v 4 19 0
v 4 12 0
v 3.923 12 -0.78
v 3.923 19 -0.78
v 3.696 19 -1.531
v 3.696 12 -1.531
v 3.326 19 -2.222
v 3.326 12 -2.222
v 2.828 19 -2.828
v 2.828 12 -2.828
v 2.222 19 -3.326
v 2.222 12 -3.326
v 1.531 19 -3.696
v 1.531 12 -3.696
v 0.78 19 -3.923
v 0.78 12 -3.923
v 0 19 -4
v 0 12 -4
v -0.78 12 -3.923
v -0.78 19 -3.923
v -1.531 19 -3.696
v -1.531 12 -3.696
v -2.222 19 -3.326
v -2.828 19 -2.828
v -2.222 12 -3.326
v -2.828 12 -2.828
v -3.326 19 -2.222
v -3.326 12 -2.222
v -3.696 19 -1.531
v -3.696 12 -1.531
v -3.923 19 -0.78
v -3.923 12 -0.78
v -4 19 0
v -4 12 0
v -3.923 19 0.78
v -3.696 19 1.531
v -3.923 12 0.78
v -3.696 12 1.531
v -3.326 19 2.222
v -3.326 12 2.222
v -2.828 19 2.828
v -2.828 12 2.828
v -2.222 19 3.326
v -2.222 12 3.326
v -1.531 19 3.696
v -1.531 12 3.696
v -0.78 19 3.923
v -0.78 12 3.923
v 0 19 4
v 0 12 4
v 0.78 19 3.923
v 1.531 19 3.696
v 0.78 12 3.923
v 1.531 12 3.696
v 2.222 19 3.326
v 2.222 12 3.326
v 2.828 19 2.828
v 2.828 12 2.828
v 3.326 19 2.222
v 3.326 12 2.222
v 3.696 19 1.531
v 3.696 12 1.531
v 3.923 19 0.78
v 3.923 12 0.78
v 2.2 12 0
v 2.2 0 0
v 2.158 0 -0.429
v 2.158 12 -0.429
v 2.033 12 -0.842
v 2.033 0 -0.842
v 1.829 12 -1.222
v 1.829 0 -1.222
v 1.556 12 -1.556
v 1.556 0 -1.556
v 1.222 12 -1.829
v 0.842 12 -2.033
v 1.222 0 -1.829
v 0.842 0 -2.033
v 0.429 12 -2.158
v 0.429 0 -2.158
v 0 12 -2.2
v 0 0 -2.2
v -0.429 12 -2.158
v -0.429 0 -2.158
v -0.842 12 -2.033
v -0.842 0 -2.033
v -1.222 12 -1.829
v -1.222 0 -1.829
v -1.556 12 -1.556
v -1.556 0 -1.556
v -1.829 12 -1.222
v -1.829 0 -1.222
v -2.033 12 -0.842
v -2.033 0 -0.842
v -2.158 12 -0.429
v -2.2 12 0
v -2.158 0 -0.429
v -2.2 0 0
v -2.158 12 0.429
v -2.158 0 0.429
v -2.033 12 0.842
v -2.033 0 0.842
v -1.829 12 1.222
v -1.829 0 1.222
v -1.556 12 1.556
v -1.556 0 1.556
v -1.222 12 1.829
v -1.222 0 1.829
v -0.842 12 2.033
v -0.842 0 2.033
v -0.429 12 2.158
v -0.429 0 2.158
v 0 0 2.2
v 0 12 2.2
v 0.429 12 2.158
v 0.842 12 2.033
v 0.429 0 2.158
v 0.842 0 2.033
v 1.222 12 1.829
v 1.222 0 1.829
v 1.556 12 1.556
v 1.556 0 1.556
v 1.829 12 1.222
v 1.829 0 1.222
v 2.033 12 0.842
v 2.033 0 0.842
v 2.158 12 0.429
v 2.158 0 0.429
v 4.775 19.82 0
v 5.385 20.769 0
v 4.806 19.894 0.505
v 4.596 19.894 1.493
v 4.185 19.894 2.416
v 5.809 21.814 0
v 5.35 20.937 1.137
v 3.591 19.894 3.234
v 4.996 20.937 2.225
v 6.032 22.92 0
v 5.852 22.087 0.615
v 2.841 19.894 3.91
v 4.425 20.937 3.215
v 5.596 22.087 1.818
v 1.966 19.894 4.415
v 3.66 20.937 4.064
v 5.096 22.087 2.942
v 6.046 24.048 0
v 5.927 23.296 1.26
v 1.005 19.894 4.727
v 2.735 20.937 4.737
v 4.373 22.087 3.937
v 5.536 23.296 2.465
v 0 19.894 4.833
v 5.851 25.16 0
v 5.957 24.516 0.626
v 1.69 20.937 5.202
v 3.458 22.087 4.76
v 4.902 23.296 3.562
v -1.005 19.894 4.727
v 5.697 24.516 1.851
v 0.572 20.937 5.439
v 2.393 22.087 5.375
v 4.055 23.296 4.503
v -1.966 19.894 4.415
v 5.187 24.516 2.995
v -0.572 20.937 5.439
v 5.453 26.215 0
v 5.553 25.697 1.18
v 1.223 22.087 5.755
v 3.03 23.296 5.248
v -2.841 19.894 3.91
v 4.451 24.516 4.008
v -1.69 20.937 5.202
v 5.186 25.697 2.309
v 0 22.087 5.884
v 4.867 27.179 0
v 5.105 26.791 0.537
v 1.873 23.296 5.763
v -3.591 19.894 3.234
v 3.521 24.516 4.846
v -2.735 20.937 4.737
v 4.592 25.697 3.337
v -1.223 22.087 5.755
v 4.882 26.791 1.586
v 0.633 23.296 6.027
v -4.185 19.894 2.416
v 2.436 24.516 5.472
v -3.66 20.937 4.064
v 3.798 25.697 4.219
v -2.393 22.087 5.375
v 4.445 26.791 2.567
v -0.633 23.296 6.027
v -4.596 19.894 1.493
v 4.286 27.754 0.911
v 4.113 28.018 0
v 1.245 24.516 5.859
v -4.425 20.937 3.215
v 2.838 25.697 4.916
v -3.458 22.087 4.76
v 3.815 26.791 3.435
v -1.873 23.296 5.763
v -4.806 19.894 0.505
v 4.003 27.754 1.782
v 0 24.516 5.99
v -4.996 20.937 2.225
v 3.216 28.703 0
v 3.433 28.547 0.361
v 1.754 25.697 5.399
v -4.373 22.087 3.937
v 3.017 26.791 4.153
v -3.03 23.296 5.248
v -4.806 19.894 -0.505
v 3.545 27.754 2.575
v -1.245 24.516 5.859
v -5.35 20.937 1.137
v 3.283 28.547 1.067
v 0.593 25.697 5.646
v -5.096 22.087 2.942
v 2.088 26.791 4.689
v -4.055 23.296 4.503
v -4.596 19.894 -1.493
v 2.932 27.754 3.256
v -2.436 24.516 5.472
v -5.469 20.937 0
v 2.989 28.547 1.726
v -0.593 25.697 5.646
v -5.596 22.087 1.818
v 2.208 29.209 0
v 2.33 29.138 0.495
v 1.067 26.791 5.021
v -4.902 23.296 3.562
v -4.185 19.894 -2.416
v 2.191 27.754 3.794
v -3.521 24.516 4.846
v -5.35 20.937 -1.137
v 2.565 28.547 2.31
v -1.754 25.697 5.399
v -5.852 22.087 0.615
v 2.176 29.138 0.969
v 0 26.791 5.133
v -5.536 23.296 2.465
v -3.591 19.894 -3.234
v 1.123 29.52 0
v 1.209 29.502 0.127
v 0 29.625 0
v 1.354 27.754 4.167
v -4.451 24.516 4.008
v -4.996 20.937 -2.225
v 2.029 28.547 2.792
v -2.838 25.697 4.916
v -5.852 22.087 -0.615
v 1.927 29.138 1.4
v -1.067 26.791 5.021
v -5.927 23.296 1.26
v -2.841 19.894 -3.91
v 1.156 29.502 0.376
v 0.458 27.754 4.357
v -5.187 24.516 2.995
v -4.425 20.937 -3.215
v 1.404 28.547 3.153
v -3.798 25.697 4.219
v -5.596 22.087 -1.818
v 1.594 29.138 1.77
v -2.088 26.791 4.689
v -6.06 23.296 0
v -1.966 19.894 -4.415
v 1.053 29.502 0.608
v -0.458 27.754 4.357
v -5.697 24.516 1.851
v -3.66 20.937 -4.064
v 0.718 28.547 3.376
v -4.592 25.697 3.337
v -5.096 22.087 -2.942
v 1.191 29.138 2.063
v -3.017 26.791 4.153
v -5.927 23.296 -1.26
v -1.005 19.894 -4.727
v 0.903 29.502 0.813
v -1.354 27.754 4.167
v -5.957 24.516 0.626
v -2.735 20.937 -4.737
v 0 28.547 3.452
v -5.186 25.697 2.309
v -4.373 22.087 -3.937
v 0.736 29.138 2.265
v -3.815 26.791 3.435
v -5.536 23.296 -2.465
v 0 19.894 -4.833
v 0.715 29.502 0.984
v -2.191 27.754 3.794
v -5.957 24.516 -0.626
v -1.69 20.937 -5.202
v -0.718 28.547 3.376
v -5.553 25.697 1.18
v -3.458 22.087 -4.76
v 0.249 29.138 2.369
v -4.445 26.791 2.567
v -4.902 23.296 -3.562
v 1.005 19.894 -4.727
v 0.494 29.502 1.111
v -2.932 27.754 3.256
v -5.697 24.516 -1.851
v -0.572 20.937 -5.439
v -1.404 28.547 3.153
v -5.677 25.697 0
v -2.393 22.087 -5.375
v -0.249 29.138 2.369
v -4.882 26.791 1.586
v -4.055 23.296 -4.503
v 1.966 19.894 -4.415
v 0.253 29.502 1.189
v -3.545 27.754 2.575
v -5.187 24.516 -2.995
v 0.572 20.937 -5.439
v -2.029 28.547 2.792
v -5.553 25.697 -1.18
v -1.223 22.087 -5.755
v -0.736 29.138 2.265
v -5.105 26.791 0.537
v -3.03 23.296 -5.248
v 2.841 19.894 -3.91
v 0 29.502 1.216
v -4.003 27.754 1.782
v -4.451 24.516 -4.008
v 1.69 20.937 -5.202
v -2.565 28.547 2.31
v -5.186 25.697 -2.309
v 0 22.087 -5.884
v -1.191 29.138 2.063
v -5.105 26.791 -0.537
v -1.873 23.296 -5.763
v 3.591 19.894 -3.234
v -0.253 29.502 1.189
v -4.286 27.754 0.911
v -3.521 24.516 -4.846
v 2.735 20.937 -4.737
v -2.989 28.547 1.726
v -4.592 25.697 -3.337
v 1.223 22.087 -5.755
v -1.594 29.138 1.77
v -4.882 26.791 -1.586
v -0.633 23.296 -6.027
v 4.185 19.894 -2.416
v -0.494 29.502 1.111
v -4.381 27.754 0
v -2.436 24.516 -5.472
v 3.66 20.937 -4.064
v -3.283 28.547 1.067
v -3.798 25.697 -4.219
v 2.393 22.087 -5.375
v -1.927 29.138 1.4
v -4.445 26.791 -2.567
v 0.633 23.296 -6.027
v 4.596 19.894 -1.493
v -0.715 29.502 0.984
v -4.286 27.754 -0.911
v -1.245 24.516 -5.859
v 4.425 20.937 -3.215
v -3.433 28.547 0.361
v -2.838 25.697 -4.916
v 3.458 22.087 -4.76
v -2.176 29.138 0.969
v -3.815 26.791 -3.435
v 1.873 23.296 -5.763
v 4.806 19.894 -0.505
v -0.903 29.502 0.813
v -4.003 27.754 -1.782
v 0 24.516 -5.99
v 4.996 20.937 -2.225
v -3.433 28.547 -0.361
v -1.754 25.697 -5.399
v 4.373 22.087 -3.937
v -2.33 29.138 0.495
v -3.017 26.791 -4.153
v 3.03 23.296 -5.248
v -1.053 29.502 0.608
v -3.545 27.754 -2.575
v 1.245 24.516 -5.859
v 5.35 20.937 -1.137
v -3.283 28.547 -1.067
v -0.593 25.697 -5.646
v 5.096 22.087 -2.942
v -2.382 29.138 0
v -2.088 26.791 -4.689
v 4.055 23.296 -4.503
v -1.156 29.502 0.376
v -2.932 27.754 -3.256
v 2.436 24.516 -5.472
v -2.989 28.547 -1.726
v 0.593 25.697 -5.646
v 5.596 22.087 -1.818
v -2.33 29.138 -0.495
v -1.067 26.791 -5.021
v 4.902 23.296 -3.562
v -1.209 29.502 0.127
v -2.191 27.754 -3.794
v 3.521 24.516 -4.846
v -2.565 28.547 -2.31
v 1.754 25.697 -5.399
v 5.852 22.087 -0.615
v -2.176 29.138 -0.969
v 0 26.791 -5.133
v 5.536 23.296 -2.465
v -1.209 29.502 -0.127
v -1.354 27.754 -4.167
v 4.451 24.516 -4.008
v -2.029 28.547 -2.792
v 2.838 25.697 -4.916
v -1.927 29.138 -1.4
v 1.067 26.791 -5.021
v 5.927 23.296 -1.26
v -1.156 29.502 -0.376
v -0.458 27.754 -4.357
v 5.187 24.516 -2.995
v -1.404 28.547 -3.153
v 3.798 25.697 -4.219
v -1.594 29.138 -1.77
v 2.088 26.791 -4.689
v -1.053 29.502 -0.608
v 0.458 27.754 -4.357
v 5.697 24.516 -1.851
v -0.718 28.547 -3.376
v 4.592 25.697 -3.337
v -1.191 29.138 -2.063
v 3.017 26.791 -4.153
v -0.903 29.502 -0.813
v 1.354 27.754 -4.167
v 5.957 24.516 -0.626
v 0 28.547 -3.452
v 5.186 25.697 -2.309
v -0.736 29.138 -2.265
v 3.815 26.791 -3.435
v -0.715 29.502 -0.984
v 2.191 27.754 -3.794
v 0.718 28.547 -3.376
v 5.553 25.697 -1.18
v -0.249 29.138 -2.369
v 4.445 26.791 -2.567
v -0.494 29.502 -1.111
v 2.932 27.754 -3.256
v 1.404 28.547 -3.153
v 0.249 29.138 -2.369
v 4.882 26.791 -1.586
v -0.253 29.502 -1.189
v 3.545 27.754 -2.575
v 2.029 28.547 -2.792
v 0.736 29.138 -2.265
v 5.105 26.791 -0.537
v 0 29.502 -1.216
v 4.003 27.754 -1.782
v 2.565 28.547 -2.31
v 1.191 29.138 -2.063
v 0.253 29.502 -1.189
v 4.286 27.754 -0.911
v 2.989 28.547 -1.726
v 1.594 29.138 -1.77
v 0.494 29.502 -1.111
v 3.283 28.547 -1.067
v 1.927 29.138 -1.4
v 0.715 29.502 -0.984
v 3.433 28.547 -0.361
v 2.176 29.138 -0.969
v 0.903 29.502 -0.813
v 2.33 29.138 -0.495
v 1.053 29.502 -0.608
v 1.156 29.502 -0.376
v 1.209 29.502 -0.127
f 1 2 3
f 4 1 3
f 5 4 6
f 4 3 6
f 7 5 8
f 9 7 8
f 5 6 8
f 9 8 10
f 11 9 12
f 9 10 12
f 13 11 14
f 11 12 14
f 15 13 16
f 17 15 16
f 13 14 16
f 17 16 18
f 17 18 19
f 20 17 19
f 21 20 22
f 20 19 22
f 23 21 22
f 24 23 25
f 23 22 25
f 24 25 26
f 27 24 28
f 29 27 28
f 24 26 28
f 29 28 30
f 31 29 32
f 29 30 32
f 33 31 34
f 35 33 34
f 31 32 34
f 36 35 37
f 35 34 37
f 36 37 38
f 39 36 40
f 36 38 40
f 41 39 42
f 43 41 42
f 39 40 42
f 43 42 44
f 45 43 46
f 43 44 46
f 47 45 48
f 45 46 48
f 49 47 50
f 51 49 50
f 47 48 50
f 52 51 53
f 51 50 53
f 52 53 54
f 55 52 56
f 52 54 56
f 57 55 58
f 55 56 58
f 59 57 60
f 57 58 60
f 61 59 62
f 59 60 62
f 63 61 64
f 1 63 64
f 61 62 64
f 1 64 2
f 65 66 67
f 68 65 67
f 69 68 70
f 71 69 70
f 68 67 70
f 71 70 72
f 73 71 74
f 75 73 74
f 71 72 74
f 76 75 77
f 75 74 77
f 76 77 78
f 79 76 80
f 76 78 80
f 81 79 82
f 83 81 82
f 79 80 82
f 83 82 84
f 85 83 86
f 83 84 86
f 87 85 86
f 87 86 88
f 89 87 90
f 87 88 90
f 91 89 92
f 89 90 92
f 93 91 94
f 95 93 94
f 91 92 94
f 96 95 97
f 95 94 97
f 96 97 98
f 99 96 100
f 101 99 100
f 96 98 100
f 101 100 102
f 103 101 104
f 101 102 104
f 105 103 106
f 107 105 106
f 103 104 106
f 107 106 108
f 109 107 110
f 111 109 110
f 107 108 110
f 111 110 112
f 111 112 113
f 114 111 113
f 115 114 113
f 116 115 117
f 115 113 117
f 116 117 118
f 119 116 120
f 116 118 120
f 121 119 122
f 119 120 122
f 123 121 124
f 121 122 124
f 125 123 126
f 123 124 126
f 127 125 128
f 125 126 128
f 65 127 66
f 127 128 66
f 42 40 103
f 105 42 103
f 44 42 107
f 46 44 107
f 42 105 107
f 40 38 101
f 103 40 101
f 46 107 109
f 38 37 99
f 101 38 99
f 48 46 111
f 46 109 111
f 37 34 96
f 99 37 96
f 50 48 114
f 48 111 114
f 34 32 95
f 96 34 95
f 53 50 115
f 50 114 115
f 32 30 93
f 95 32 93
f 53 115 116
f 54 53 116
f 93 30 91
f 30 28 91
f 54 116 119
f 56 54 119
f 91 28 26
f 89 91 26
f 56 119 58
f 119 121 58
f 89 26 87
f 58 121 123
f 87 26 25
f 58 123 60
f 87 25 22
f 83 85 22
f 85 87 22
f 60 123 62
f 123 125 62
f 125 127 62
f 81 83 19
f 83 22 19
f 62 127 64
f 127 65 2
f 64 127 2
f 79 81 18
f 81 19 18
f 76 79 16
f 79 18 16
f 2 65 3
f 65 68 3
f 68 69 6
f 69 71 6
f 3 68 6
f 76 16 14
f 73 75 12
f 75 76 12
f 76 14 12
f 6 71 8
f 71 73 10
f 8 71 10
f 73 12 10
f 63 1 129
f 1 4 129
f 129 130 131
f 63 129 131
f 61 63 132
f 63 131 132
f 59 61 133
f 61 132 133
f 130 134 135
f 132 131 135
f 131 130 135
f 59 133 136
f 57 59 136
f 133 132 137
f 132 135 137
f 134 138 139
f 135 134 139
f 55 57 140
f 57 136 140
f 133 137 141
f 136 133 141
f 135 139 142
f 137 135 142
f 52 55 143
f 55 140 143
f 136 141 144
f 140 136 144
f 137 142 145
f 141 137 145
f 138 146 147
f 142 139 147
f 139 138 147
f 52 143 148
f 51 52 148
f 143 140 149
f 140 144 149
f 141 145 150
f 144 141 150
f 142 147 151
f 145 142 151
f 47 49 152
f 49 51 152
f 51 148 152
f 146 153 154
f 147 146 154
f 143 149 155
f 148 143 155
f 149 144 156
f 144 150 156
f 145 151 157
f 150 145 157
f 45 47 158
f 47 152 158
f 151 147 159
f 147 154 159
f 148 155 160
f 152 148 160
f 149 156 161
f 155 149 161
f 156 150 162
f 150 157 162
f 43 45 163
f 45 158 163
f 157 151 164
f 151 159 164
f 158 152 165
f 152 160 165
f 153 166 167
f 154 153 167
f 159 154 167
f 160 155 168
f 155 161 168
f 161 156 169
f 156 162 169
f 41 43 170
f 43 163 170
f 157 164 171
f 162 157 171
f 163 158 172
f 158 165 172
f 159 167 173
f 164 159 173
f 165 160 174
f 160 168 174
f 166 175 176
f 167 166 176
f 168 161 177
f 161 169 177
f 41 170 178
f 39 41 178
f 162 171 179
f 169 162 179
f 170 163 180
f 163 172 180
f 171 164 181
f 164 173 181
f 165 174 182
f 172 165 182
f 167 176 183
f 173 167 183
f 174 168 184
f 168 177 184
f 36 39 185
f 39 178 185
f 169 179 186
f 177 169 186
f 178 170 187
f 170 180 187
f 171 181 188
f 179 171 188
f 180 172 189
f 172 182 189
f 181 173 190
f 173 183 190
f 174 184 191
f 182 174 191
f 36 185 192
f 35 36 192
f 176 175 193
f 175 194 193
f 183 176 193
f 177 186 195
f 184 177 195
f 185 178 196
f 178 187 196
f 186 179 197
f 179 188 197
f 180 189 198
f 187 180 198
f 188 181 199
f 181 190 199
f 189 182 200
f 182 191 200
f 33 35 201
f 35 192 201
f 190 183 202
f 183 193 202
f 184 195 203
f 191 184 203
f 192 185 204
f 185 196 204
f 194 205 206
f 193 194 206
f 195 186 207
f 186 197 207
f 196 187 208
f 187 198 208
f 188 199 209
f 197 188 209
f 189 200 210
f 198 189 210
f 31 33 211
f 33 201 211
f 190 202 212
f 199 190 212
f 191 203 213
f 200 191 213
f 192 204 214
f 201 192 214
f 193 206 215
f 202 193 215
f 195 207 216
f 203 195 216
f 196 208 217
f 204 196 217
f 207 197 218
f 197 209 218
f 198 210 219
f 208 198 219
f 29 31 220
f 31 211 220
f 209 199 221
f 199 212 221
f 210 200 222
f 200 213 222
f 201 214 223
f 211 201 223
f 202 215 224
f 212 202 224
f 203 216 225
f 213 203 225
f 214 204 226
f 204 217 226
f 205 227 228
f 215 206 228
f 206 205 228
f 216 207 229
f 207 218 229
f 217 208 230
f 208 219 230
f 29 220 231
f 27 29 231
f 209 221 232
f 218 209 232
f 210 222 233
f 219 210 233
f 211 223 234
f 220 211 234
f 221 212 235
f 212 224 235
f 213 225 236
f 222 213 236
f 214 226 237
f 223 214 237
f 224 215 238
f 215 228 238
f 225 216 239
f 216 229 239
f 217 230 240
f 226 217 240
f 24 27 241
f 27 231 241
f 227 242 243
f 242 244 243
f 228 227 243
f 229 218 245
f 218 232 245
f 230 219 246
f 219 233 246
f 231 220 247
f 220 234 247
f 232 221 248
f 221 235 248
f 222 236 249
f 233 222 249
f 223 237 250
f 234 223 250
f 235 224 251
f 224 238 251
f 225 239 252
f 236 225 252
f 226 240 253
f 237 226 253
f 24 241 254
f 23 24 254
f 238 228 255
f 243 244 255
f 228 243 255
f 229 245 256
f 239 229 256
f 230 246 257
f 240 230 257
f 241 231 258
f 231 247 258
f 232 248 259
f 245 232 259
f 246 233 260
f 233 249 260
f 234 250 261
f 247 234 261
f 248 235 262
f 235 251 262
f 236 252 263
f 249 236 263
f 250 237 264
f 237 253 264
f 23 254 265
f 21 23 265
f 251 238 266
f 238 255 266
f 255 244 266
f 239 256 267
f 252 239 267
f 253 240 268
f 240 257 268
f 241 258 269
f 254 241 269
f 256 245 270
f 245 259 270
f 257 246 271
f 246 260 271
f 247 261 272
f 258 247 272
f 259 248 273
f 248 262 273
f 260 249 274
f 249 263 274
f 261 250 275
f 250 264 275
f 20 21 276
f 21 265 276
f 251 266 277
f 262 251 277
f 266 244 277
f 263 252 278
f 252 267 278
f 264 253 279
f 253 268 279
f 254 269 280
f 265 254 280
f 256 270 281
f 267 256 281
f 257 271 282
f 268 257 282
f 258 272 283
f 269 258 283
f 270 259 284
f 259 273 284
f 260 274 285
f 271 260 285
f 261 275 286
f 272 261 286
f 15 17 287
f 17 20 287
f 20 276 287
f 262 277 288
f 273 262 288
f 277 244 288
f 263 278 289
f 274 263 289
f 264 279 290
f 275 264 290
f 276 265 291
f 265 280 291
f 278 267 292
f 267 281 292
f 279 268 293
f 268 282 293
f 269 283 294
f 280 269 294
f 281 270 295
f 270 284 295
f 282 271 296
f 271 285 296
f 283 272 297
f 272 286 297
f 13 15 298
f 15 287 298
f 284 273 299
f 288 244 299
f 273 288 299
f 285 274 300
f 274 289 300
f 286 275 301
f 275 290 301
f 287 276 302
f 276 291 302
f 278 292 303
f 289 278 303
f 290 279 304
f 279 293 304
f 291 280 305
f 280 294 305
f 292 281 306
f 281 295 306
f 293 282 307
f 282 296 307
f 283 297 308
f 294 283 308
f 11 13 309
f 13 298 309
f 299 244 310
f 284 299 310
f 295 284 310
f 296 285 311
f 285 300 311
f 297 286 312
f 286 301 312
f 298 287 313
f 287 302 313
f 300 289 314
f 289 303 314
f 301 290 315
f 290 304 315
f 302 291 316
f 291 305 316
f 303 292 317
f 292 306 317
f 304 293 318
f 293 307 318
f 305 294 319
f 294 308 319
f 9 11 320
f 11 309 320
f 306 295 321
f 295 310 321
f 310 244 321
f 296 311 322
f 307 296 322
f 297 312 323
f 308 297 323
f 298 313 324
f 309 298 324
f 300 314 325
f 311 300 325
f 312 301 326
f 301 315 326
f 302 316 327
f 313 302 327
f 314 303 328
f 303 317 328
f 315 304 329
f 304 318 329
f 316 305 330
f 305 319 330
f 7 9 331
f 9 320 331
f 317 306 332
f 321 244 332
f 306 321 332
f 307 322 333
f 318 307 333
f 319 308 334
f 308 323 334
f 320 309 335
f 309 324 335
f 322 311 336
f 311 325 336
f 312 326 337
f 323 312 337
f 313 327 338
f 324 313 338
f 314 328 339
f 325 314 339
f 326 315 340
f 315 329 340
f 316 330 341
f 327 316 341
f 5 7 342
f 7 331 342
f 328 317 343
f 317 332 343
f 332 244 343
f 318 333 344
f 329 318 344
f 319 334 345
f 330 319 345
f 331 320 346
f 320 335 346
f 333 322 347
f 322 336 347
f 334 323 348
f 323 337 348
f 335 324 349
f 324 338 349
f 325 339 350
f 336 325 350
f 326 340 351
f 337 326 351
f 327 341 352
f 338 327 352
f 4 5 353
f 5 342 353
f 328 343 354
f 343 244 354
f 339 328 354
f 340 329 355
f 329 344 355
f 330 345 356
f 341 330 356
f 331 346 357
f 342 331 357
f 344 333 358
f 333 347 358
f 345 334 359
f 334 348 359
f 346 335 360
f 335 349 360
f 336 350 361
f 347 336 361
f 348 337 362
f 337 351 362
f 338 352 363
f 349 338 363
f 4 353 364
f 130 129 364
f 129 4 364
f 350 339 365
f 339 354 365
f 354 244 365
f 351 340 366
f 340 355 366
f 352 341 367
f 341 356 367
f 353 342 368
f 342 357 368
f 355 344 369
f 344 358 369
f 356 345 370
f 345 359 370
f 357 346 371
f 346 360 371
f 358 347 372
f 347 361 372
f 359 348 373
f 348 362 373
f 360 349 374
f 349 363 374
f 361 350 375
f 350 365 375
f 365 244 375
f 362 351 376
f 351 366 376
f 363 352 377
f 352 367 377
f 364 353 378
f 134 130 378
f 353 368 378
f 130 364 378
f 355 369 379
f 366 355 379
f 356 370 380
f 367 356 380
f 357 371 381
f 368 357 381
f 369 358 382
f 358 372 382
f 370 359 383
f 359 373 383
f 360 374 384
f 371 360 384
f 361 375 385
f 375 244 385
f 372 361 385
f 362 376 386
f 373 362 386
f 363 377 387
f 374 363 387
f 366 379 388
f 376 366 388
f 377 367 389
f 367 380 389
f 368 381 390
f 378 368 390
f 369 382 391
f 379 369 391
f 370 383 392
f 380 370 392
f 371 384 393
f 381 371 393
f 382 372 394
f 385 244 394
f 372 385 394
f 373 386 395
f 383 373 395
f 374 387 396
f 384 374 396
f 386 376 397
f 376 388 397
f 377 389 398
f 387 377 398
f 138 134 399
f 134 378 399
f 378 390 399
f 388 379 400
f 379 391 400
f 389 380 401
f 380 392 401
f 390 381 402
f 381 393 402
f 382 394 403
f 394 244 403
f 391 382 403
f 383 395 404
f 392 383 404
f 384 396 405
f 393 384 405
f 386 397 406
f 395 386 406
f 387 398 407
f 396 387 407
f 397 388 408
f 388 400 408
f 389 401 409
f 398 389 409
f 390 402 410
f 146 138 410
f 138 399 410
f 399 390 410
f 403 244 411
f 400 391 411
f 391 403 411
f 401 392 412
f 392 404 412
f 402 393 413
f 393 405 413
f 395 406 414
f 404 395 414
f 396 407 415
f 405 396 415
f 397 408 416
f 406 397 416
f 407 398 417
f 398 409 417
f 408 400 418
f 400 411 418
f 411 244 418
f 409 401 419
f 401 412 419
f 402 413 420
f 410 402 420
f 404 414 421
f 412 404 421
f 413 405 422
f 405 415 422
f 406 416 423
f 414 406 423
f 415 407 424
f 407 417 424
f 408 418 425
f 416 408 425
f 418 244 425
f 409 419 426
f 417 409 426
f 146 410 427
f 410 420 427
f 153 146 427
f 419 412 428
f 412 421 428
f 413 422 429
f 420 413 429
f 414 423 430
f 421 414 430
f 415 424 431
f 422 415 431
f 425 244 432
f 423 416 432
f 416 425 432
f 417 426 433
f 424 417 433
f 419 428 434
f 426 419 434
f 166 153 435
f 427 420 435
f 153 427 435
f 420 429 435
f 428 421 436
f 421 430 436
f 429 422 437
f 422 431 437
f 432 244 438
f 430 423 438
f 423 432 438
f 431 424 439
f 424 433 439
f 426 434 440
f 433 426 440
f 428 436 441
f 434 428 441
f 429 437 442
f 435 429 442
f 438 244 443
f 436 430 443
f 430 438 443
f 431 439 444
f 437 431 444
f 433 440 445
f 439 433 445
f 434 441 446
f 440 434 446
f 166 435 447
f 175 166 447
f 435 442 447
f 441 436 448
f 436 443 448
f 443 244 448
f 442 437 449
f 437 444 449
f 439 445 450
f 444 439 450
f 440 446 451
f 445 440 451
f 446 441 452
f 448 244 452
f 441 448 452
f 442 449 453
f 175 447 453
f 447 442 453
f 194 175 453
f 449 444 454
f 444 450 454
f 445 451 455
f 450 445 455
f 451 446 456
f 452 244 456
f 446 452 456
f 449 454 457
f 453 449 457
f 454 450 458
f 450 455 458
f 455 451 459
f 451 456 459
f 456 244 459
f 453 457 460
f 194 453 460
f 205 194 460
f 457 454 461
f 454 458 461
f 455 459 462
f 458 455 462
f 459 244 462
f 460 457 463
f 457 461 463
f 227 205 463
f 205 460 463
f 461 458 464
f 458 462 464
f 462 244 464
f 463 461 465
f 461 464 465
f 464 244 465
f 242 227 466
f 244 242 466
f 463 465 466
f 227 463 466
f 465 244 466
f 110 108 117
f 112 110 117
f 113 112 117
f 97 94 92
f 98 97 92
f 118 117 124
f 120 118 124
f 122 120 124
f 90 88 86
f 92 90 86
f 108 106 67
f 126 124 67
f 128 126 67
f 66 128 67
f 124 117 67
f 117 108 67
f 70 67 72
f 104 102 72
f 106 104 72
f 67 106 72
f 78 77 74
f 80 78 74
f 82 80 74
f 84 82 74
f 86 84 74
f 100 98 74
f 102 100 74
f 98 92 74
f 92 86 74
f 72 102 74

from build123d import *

# Parameters (mm, degrees)
SKETCH1_R           = 2.2
BOSS_EXTRUDE1_DEPTH = 12
SKETCH3_R           = 4
BOSS_EXTRUDE2_DEPTH = 7


with BuildPart() as part:
    # Sketch1 → Boss-Extrude1 (new body)
    with BuildSketch(Plane(origin=(0, 0, 0), x_dir=(1, 0, 0), z_dir=(0, 1, 0))):
        Circle(SKETCH1_R)
    extrude(amount=BOSS_EXTRUDE1_DEPTH)

    # Sketch3 → Boss-Extrude2 (add)
    with BuildSketch(Plane(origin=(0, 12, 0), x_dir=(1, 0, 0), z_dir=(0, 1, 0))):
        Circle(SKETCH3_R)
    extrude(amount=BOSS_EXTRUDE2_DEPTH)

    # Sketch4 → Revolve2 (revolve)
    with BuildSketch(Plane.XY):
        with BuildLine():
            Line((0, 28.11938617), (0, 19))
            Line((0, 19), (4, 19))
            ThreePointArc((4, 19), (5.676610407, 25.69672264), (0, 29.62523519))
            Line((0, 29.62523519), (0, 28.11938617))
        make_face()
    revolve(axis=Axis((0, 28.11938617, 0), (0, -1, 0)))


solid = part.part
